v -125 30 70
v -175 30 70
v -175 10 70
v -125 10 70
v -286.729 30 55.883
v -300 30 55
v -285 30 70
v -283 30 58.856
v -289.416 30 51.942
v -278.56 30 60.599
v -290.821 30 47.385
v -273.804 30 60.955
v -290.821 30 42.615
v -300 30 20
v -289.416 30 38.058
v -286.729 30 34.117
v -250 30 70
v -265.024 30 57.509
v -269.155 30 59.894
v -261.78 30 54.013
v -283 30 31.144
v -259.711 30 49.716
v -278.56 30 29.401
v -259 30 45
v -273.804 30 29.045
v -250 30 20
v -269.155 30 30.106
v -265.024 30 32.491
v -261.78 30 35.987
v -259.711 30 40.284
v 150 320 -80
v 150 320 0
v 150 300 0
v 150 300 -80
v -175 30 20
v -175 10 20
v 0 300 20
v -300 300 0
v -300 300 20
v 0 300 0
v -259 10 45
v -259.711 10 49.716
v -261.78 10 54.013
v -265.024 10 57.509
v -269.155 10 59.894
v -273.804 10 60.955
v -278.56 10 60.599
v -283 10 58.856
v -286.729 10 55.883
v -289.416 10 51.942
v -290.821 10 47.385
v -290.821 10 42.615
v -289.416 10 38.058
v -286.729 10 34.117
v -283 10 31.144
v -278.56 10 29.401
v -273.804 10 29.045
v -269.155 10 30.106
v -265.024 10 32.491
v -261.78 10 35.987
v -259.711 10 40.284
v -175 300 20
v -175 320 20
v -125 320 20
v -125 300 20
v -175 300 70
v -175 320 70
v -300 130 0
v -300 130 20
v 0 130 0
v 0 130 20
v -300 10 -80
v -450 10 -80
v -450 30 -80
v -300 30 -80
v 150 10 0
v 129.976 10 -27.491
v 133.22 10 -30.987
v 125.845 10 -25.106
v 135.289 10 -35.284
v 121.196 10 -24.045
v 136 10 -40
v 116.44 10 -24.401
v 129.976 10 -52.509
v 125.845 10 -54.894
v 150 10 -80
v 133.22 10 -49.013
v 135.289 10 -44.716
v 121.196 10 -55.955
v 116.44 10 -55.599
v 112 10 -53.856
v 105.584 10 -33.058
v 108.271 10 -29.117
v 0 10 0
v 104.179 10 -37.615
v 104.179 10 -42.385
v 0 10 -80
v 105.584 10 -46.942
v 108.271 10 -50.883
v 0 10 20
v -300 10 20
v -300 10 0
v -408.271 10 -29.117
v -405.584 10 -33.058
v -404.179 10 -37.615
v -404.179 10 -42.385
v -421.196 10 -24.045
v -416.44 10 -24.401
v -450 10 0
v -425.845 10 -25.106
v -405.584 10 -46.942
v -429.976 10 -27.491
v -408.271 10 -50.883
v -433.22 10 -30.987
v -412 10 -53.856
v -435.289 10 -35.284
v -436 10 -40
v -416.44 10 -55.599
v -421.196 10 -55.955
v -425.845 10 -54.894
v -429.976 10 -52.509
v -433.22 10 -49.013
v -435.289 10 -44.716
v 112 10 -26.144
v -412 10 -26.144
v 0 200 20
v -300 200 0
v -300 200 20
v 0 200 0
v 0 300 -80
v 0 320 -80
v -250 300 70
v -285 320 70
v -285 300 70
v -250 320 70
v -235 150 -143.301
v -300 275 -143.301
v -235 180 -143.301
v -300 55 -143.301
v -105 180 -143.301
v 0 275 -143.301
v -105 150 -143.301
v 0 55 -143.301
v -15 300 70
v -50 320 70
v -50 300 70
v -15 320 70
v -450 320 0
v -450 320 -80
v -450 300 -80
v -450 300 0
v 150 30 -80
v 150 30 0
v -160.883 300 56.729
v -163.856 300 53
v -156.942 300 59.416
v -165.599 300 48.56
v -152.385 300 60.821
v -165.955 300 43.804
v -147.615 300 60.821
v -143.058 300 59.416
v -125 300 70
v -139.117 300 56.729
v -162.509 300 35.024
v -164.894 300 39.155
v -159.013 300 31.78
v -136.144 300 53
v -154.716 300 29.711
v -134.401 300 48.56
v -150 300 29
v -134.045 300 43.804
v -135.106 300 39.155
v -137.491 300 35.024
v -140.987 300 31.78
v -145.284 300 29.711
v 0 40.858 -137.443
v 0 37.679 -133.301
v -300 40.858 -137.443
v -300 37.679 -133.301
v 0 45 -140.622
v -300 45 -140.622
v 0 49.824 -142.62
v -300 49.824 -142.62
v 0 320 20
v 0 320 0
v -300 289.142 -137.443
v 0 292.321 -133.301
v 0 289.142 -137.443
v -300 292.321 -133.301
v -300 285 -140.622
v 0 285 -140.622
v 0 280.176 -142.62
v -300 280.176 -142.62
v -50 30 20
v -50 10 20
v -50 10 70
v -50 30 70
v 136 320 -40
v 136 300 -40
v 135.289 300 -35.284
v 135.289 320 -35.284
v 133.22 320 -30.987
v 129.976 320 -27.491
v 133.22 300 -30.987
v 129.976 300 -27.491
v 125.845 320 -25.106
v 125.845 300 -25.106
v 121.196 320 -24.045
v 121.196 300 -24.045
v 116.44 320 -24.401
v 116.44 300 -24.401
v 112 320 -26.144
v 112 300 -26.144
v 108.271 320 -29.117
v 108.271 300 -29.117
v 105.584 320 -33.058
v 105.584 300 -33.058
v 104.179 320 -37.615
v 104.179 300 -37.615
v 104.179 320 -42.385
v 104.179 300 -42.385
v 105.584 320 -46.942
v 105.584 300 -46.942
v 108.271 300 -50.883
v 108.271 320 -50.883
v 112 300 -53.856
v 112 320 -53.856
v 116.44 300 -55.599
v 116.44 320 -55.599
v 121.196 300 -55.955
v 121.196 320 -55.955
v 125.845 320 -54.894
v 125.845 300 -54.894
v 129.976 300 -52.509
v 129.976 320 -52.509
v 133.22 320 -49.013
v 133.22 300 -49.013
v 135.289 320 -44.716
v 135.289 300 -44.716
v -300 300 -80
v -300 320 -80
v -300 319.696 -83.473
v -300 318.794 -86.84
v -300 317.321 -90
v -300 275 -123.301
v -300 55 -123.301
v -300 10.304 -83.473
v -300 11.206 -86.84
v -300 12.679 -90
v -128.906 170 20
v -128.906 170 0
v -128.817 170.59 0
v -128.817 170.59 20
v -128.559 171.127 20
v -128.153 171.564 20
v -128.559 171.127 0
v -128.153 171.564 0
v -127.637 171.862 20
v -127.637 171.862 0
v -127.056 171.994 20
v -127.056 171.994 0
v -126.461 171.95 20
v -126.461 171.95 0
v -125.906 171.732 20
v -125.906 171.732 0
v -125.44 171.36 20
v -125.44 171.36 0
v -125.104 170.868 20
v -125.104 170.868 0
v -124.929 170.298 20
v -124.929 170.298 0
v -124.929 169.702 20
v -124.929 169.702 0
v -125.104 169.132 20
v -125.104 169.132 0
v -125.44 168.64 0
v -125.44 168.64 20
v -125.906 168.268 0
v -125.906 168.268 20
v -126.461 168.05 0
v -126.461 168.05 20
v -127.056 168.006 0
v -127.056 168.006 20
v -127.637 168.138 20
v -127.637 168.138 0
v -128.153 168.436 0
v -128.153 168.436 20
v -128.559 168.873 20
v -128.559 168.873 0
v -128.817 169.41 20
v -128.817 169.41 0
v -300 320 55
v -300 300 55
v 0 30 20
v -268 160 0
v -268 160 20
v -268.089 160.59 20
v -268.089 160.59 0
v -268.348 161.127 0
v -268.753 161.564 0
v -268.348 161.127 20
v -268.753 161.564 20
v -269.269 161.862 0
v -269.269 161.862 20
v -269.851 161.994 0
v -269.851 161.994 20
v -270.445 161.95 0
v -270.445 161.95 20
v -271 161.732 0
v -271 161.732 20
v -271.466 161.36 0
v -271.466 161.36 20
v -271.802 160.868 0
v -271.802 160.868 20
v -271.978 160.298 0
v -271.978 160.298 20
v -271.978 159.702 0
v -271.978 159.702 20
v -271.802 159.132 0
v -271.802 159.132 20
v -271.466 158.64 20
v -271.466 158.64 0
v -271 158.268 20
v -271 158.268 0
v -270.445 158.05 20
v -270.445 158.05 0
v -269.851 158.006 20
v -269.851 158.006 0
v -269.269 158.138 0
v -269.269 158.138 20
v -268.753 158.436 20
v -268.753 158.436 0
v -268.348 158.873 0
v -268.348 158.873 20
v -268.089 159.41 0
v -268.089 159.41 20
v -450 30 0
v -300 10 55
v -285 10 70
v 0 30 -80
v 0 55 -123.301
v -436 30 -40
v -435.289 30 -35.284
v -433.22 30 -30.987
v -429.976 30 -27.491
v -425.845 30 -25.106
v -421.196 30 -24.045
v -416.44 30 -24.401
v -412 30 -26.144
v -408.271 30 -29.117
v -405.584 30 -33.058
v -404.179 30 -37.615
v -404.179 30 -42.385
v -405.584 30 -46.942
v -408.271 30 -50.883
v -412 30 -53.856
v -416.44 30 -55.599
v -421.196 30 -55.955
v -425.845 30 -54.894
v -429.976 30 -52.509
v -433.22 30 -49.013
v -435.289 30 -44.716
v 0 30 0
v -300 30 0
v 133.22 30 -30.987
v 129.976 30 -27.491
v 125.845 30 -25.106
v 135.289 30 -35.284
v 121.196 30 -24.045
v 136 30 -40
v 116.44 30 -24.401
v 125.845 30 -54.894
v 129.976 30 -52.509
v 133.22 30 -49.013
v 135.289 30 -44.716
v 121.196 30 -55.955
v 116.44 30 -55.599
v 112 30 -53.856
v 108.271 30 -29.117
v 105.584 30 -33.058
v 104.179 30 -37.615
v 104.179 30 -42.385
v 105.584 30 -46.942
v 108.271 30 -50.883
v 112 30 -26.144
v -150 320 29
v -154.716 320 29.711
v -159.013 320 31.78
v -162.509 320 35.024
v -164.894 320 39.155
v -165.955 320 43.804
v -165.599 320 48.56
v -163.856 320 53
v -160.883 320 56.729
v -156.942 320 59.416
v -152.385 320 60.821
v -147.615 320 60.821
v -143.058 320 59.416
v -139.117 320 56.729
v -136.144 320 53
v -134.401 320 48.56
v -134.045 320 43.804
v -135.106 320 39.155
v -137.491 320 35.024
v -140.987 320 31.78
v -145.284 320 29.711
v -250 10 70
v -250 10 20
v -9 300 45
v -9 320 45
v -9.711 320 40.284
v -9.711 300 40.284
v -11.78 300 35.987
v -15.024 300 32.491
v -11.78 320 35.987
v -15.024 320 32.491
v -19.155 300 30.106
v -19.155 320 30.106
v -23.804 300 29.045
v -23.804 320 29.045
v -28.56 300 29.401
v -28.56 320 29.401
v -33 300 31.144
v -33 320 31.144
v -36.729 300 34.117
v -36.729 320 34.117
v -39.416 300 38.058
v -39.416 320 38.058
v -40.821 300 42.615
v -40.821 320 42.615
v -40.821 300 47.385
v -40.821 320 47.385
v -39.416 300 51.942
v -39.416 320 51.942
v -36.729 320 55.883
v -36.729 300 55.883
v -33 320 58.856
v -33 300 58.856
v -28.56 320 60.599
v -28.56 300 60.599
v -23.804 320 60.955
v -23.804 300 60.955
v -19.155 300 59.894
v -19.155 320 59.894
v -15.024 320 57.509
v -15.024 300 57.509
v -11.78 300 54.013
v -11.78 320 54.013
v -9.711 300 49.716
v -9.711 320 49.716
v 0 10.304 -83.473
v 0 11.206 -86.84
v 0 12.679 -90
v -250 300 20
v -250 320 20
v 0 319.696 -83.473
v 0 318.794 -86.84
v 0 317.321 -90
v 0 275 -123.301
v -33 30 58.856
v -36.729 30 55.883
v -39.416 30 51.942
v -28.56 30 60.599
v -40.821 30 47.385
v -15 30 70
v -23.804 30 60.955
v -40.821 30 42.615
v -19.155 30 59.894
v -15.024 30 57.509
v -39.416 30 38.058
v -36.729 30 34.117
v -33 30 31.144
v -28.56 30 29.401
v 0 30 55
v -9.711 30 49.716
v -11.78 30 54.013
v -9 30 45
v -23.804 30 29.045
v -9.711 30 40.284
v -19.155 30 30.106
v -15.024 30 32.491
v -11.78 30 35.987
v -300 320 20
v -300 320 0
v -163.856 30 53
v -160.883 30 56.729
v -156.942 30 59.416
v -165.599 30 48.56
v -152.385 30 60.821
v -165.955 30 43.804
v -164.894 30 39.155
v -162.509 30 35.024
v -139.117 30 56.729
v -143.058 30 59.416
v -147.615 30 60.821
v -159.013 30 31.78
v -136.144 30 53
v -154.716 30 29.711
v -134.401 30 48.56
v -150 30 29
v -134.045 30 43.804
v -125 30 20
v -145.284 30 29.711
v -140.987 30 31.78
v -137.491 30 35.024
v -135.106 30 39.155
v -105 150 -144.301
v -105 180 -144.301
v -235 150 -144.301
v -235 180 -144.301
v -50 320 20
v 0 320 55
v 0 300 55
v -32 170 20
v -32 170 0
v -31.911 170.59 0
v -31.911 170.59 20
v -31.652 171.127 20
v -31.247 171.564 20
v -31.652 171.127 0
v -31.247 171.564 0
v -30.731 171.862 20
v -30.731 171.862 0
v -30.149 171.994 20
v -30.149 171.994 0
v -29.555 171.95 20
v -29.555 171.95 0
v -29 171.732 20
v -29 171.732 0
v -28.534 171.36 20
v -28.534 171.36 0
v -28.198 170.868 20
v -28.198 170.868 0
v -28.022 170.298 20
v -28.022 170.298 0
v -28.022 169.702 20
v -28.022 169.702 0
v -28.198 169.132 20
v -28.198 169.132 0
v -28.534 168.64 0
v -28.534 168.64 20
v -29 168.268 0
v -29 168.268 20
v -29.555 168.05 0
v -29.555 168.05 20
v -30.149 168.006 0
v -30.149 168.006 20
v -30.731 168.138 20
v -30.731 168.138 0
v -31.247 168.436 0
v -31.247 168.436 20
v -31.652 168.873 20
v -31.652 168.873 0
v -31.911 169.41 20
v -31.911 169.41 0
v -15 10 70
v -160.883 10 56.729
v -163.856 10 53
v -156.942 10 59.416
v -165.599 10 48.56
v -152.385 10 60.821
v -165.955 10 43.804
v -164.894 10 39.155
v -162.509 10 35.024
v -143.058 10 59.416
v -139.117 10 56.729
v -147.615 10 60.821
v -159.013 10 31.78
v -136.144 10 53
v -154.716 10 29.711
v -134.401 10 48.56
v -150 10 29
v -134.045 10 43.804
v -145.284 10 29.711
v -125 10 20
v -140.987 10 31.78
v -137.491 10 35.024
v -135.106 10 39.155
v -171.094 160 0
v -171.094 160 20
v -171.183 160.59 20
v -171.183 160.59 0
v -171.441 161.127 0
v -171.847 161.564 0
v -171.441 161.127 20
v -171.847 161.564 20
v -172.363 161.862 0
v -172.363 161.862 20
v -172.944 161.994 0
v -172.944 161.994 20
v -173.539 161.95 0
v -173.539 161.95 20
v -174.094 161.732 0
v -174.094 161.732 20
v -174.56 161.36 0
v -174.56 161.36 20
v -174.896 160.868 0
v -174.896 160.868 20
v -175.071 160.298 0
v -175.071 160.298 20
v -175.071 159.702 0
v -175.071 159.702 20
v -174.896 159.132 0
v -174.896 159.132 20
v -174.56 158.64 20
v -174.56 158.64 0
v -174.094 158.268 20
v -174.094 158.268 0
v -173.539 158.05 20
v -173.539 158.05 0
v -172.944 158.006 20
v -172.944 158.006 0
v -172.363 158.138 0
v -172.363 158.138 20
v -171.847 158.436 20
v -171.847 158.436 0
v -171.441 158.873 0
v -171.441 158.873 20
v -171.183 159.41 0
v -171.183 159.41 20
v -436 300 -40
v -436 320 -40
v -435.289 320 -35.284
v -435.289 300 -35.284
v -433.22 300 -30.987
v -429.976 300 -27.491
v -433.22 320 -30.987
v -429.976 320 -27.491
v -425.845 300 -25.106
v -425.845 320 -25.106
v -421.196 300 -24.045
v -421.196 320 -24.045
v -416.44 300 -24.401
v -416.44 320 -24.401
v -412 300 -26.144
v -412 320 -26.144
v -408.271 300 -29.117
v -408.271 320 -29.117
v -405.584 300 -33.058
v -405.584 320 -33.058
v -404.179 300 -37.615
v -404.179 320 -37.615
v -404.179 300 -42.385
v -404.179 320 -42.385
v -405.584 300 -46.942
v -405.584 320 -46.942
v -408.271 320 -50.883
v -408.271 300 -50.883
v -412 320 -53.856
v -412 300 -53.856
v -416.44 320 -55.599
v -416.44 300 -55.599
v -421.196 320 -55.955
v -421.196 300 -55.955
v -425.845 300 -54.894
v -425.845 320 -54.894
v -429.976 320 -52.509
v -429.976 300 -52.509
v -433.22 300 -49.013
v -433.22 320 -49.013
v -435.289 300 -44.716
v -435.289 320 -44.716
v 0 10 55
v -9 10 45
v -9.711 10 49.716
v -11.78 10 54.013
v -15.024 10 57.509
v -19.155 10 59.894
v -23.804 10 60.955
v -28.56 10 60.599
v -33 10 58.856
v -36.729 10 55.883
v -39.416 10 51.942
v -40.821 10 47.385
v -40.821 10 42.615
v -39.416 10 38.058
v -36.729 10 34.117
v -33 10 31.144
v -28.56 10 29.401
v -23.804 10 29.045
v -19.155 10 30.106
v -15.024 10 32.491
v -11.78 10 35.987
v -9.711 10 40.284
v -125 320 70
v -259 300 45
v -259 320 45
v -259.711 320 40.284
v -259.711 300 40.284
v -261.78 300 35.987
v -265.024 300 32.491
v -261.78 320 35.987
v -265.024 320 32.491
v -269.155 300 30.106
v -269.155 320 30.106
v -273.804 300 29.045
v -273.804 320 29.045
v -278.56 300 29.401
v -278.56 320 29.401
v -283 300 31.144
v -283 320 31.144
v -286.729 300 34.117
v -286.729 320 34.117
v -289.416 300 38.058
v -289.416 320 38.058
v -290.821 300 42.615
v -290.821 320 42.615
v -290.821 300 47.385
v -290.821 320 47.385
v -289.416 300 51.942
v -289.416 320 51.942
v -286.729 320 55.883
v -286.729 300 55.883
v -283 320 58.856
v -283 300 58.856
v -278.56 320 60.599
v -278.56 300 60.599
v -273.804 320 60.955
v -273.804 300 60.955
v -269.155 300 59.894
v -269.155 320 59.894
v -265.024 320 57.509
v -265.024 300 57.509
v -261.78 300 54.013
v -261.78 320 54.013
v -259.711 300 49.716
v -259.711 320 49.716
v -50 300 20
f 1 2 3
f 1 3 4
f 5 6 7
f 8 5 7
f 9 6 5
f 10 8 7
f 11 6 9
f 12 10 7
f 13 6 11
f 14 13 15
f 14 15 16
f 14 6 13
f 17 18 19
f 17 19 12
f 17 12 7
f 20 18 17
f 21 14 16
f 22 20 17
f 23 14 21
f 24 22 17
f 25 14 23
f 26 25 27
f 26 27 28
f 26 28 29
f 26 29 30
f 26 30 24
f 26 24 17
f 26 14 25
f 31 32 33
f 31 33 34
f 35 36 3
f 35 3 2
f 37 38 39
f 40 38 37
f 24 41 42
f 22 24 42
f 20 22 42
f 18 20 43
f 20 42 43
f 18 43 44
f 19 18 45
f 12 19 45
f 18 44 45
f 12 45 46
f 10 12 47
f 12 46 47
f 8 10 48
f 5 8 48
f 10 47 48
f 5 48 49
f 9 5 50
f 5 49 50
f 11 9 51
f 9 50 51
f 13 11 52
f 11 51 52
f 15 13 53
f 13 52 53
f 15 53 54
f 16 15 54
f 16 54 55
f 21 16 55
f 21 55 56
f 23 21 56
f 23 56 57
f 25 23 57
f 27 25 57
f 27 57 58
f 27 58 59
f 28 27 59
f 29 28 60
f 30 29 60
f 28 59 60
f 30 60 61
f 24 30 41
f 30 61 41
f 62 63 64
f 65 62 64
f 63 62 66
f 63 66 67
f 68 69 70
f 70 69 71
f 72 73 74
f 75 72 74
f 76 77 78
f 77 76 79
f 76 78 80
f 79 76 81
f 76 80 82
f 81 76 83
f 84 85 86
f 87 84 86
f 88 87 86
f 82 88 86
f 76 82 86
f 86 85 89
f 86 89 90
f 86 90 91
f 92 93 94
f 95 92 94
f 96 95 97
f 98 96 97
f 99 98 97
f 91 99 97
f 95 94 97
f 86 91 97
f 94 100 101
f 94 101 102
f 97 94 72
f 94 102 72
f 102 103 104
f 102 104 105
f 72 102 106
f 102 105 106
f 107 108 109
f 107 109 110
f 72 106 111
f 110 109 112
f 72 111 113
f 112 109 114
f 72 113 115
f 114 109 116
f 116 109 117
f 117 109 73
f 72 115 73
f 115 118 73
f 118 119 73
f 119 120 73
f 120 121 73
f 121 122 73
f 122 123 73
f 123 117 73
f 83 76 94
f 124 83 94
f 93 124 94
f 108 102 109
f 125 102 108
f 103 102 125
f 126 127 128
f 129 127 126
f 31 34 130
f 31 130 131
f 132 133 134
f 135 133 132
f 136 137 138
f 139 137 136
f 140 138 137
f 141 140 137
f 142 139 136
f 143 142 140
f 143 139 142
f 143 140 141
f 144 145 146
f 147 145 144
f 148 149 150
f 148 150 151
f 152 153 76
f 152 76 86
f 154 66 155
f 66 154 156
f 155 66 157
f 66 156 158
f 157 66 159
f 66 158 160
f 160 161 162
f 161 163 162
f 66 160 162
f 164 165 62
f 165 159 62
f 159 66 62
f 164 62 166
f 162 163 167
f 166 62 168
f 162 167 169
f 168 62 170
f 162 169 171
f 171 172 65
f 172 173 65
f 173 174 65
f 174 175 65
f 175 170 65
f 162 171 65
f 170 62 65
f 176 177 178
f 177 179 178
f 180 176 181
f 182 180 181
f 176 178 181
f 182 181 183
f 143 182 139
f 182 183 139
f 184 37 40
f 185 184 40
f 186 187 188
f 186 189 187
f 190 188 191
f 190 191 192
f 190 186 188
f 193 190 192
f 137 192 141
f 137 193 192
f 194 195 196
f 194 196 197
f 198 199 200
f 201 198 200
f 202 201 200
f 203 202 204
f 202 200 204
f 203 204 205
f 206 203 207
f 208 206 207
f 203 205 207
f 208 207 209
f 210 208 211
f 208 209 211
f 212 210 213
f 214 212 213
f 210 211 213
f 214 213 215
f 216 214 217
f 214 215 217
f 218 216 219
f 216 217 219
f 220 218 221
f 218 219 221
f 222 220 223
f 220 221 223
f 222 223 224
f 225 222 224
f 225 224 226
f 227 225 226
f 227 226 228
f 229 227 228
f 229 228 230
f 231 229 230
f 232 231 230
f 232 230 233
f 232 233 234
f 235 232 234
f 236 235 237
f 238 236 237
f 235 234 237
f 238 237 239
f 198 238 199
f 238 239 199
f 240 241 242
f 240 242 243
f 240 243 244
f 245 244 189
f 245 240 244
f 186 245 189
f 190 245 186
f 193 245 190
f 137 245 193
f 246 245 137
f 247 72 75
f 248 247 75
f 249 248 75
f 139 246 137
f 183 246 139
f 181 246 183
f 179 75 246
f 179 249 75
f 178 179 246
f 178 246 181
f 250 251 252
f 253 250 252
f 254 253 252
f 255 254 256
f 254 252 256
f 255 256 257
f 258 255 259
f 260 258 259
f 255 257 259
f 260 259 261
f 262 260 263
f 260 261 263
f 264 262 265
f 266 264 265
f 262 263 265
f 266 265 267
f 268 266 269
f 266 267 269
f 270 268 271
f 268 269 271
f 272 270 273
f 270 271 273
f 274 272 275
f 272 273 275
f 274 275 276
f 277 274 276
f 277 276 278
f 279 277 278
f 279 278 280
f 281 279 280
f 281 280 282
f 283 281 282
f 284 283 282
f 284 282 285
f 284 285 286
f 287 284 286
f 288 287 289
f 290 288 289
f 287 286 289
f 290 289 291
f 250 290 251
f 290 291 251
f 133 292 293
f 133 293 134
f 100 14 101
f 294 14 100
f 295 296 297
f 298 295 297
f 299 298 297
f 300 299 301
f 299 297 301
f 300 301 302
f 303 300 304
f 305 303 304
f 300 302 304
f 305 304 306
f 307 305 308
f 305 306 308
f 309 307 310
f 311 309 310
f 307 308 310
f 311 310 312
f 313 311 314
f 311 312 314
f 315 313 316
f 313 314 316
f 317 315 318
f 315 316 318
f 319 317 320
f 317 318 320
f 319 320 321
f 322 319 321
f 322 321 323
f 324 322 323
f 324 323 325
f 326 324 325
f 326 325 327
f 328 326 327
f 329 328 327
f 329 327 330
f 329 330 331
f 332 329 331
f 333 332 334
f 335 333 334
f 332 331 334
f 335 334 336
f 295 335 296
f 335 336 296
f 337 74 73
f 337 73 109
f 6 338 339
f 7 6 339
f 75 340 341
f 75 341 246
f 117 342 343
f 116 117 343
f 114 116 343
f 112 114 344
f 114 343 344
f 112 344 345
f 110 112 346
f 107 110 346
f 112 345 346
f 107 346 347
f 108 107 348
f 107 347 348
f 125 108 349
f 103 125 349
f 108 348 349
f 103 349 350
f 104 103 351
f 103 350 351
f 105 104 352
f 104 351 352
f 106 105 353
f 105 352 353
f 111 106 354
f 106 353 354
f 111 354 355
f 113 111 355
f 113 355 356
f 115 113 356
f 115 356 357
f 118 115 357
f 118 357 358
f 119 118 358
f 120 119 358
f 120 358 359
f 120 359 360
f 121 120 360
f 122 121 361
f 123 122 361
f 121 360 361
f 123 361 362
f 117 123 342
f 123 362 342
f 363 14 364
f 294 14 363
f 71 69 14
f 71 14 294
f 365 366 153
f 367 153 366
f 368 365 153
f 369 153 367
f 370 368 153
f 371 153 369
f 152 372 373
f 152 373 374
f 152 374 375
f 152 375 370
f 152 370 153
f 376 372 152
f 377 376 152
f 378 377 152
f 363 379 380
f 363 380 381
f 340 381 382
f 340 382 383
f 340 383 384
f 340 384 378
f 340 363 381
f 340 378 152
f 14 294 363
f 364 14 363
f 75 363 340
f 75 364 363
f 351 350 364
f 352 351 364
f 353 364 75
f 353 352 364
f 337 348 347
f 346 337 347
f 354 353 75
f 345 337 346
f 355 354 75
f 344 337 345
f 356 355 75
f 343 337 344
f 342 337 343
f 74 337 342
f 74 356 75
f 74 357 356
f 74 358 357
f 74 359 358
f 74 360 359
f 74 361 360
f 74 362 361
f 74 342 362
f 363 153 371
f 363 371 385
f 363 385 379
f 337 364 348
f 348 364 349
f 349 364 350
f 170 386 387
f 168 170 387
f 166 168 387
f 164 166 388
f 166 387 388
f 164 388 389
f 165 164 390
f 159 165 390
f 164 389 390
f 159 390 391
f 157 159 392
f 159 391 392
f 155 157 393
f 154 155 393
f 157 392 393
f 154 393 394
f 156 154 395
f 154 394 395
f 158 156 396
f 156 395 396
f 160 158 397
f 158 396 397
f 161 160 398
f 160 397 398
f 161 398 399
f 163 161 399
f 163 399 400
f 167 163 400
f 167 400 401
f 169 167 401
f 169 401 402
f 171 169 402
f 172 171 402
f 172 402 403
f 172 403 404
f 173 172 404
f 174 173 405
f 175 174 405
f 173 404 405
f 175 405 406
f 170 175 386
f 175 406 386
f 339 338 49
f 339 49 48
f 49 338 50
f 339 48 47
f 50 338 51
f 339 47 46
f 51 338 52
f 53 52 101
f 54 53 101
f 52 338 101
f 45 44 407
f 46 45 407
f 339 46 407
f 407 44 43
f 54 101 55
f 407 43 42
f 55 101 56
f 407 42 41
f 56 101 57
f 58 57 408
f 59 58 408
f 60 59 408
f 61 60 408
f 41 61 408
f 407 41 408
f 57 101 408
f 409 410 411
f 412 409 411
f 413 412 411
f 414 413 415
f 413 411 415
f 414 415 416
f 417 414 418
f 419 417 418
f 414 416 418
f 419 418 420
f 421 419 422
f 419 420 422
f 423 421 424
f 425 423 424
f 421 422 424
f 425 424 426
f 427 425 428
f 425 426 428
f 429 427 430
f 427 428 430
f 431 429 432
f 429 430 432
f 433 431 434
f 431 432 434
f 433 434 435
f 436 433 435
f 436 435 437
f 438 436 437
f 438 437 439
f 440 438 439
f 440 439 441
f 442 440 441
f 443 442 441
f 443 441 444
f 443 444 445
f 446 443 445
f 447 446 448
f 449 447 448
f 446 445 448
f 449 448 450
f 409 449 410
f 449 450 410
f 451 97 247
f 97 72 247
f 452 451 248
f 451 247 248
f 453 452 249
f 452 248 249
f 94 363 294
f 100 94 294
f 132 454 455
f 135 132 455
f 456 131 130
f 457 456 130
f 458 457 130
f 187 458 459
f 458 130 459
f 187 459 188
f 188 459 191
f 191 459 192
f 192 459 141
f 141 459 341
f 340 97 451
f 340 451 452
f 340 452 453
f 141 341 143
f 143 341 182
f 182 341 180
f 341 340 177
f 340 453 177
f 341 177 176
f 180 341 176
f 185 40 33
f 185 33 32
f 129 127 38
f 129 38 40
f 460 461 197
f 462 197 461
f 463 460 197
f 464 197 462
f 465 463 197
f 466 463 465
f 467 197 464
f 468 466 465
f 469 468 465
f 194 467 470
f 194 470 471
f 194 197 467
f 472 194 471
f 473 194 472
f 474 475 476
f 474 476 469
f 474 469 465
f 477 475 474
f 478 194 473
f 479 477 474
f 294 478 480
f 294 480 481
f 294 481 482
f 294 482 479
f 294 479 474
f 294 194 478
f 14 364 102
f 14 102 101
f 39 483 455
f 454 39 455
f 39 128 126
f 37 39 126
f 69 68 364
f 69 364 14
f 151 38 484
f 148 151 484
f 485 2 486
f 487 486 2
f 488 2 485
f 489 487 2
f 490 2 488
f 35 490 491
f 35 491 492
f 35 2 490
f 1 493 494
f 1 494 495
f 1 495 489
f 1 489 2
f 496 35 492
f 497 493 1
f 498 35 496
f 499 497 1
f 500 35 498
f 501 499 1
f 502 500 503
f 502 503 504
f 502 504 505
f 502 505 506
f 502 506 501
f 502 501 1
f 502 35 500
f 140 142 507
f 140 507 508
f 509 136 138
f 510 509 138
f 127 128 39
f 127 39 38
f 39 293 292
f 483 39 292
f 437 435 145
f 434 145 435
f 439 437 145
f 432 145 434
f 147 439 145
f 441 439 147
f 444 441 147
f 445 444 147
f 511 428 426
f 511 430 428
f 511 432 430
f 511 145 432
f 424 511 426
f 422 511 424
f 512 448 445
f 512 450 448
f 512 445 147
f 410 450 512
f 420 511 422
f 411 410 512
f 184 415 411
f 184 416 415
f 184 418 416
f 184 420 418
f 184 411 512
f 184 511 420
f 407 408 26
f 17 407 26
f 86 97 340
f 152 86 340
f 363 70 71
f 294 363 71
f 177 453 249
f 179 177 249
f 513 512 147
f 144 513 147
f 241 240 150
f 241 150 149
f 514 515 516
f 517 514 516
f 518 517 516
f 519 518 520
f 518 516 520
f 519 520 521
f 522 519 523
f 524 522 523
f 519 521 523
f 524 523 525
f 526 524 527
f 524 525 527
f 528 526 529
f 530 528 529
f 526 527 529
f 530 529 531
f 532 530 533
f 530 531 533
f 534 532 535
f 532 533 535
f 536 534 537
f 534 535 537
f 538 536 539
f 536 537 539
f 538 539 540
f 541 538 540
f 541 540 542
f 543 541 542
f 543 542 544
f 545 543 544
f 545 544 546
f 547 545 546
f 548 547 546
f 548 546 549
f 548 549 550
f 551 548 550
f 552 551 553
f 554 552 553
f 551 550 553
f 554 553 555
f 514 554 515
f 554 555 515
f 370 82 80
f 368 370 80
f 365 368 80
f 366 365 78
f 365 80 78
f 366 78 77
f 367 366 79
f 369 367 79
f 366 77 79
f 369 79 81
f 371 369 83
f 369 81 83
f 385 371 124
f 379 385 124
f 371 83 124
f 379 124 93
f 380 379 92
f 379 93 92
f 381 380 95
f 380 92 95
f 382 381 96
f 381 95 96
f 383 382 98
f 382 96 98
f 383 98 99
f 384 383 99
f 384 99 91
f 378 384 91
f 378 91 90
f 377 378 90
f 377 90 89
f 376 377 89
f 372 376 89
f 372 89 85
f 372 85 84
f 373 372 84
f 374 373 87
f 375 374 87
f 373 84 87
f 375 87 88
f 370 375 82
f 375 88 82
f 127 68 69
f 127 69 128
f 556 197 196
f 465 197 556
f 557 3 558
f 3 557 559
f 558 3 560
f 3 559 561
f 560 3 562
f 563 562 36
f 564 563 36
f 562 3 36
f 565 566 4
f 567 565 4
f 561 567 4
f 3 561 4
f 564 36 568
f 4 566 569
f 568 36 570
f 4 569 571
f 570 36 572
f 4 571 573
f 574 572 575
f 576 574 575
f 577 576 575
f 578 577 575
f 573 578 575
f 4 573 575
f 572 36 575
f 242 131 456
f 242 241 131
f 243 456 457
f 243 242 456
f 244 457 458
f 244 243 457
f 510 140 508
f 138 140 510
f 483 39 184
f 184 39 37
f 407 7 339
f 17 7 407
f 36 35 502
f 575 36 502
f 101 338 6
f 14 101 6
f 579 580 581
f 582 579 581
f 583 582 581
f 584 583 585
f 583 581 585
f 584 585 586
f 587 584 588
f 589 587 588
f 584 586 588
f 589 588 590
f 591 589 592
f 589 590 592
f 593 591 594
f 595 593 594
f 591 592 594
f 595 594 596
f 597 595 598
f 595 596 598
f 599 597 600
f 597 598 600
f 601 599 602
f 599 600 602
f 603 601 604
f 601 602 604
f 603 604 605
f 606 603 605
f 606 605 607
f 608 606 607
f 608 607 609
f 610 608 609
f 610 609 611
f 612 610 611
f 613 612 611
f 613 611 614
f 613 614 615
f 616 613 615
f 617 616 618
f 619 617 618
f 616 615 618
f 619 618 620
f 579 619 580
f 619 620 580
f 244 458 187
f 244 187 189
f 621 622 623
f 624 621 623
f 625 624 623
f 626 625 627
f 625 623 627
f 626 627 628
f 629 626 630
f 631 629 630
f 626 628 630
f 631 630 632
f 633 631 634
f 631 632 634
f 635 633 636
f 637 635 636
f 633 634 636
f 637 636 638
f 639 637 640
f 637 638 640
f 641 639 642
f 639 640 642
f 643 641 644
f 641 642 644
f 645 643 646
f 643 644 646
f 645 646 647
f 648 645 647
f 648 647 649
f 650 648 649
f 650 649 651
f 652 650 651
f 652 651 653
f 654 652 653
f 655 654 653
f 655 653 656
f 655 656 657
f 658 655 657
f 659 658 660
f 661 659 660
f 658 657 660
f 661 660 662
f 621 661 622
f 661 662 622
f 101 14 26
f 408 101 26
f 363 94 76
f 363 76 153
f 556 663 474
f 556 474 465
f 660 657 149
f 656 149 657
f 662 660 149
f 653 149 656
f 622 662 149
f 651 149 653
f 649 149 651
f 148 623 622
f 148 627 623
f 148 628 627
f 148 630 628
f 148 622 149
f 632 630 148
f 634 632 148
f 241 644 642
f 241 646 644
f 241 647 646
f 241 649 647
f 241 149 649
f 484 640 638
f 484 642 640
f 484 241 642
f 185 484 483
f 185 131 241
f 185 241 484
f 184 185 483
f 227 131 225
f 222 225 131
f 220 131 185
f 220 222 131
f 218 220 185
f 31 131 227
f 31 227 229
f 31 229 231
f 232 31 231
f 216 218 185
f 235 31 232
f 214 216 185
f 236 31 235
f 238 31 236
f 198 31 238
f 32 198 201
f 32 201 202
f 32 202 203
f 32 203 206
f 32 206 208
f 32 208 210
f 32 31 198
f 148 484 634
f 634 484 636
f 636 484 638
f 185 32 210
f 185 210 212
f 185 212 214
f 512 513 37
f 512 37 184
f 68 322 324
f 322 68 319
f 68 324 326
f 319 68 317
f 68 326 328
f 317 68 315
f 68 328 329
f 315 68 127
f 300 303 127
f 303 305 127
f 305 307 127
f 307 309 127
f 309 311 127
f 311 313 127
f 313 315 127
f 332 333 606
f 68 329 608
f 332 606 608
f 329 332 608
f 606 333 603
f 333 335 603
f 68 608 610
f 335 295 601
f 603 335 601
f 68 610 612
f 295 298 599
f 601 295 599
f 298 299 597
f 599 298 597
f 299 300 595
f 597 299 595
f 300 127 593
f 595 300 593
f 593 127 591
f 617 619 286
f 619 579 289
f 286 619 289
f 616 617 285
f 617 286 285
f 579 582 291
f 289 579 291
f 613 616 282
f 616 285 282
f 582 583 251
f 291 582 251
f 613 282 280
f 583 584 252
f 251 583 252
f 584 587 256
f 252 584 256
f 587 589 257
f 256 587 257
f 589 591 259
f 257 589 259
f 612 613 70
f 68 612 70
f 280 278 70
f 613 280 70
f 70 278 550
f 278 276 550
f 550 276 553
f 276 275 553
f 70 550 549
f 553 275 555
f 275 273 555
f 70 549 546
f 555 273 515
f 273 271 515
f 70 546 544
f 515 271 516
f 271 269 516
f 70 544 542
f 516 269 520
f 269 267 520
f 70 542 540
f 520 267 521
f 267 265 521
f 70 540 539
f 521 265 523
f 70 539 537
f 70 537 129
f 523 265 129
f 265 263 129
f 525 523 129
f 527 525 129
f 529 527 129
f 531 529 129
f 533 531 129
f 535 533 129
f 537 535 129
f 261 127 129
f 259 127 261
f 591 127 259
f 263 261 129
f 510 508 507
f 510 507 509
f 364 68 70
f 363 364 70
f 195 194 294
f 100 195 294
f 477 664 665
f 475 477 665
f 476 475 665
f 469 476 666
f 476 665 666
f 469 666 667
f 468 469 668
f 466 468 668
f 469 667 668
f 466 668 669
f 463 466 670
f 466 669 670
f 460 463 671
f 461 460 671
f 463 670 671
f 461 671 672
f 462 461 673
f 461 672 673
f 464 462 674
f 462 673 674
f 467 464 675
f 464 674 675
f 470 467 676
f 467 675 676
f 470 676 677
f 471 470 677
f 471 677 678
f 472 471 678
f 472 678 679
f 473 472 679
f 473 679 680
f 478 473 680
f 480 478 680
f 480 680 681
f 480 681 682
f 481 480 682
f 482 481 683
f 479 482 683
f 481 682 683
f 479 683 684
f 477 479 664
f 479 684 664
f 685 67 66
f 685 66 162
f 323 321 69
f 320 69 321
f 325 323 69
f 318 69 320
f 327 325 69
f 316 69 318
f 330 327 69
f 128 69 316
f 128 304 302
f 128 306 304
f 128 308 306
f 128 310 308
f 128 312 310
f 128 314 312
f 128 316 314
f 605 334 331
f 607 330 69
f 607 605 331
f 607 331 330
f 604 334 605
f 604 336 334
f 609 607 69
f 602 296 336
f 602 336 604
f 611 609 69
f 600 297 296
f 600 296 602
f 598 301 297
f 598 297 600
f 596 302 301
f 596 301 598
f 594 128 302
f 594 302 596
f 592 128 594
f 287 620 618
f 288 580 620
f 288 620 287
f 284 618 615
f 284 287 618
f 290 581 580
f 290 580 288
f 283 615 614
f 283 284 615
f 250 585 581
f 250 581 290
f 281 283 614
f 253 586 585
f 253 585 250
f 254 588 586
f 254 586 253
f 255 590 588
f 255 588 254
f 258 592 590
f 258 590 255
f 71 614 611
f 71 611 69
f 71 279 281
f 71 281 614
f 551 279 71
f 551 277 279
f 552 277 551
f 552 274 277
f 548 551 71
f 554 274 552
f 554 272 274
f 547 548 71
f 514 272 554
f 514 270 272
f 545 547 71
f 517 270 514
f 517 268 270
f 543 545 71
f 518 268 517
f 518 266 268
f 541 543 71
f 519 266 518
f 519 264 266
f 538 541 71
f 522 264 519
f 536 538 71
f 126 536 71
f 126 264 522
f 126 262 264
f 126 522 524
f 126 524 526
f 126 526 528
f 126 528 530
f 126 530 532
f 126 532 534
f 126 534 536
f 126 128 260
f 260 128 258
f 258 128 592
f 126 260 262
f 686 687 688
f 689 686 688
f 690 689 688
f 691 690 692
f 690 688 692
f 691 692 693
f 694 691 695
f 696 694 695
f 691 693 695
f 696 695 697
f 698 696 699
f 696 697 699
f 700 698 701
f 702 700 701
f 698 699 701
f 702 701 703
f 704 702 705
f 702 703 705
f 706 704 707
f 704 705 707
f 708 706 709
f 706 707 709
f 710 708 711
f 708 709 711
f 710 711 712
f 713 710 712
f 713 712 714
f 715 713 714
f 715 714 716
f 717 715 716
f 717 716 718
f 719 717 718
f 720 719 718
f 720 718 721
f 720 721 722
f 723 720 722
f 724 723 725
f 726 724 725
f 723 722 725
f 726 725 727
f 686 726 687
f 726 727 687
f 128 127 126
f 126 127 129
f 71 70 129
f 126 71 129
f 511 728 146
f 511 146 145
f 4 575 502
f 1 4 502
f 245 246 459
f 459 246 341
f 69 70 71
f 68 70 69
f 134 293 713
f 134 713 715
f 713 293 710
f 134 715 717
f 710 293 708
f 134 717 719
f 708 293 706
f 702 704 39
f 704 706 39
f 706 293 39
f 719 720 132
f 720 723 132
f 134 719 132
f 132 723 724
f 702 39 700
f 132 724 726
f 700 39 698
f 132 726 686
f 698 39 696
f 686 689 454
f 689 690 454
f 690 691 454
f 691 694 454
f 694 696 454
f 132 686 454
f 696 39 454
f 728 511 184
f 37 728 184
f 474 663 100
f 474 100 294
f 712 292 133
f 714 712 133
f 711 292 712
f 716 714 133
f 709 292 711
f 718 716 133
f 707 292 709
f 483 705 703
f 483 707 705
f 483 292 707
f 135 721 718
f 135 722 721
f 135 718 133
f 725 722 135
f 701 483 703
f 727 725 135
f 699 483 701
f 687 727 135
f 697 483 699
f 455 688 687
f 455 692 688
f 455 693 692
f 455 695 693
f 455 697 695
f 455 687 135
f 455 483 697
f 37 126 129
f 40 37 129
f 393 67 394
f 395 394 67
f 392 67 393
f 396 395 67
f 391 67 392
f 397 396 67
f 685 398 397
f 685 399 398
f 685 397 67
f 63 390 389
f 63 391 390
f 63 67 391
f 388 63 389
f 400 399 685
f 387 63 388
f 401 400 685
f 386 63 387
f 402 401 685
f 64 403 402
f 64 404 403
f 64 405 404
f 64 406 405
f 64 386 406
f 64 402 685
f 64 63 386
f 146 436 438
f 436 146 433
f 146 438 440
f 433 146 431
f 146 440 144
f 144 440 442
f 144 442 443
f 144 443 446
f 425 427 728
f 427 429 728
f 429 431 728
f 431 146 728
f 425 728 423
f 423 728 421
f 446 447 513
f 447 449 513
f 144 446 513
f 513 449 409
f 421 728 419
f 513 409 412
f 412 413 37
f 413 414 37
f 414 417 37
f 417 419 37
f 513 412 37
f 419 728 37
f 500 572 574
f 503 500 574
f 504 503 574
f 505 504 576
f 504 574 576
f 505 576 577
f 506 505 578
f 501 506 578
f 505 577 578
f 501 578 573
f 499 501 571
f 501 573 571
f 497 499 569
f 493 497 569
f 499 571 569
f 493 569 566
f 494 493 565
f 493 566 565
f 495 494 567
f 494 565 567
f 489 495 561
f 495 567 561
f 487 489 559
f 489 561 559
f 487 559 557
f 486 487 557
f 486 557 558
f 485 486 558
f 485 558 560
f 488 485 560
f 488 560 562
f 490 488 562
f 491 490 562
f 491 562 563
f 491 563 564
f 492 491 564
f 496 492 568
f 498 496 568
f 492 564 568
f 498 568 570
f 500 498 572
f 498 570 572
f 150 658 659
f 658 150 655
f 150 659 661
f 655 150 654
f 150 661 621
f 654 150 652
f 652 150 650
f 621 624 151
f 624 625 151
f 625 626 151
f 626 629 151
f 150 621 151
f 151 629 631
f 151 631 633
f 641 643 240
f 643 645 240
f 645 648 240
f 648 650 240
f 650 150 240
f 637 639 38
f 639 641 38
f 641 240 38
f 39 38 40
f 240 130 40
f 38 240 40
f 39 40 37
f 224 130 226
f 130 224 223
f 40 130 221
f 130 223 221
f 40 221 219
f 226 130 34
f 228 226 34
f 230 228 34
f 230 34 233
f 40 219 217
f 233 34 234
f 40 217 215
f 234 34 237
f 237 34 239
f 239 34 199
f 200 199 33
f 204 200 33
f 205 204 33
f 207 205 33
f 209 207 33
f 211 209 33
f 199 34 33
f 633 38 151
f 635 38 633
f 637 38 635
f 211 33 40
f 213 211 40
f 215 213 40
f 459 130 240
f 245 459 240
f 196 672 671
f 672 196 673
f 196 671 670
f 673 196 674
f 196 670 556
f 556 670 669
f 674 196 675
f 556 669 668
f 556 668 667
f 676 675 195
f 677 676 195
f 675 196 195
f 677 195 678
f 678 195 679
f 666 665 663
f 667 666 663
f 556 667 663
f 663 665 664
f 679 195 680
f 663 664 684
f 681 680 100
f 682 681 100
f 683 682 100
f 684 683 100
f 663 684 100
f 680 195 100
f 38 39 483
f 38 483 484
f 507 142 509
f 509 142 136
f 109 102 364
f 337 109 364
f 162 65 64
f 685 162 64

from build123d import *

# Parameters (mm, degrees)
SKETCH1_W              = 300
SKETCH1_H              = 200
BOSS_EXTRUDE1_DEPTH    = 20
SKETCH2_R              = 2
CUT_EXTRUDE1_DEPTH     = 20
SKETCH3_W              = 300
SKETCH3_H              = 130
CUT_EXTRUDE2_DEPTH     = 20
SKETCH4_R              = 2
CUT_EXTRUDE3_DEPTH     = 20
SKETCH5_W              = 300
SKETCH5_H              = 20
BOSS_EXTRUDE2_DEPTH    = 100
SKETCH6_W              = 300
SKETCH6_H              = 20
BOSS_EXTRUDE3_DEPTH    = 100
SKETCH9_W              = 300
SKETCH9_H              = 100
BOSS_EXTRUDE6_DEPTH    = 20
SKETCH10_W             = 300
SKETCH10_H             = 100
BOSS_EXTRUDE7_DEPTH    = 20
SKETCH14_W             = 80
SKETCH14_H             = 20
BOSS_EXTRUDE11_DEPTH   = 150
SKETCH15_W             = 80
SKETCH15_H             = 20
BOSS_EXTRUDE12_DEPTH   = 150
SKETCH16_W             = 80
SKETCH16_H             = 20
BOSS_EXTRUDE13_DEPTH   = 150
SKETCH17_W             = 80
SKETCH17_H             = 20
BOSS_EXTRUDE14_DEPTH   = 150
SKETCH18_R             = 16
CUT_EXTRUDE4_DEPTH     = 20
SKETCH19_R             = 16
CUT_EXTRUDE5_DEPTH     = 20
SKETCH20_R             = 16
CUT_EXTRUDE6_DEPTH     = 20
SKETCH21_R             = 16
CUT_EXTRUDE7_DEPTH     = 20
SKETCH22_W             = 50
SKETCH22_H             = 20
BOSS_EXTRUDE15_DEPTH   = 50
BOSS_EXTRUDE15_2_DEPTH = 50
BOSS_EXTRUDE15_3_DEPTH = 50
SKETCH23_W             = 50
SKETCH23_H             = 20
BOSS_EXTRUDE16_DEPTH   = 50
BOSS_EXTRUDE16_2_DEPTH = 50
BOSS_EXTRUDE16_3_DEPTH = 50
SKETCH24_R             = 16
CUT_EXTRUDE8_DEPTH     = 20
SKETCH25_R             = 16
CUT_EXTRUDE9_DEPTH     = 20
SKETCH26_R             = 16
CUT_EXTRUDE10_DEPTH    = 20
SKETCH27_R             = 16
CUT_EXTRUDE11_DEPTH    = 20
SKETCH28_R             = 16
CUT_EXTRUDE12_DEPTH    = 20
SKETCH29_R             = 16
CUT_EXTRUDE13_DEPTH    = 20
SKETCH30_W             = 300
SKETCH30_H             = 20
REVOLVE1_ANGLE         = 30
SKETCH31_W             = 300
SKETCH31_H             = 20
REVOLVE2_ANGLE         = 30
SKETCH33_W             = 300
SKETCH33_H             = 20
BOSS_EXTRUDE18_DEPTH   = 50
SKETCH34_W             = 300
SKETCH34_H             = 20
BOSS_EXTRUDE19_DEPTH   = 50
SKETCH35_W             = 300
SKETCH35_H             = 20
REVOLVE3_ANGLE         = 60
SKETCH36_W             = 300
SKETCH36_H             = 20
REVOLVE4_ANGLE         = 60
SKETCH37_W             = 300
SKETCH37_H             = 20
BOSS_EXTRUDE20_DEPTH   = 220
SKETCH38_W             = 130
SKETCH38_H             = 30
BOSS_EXTRUDE21_DEPTH   = 1


with BuildPart() as part:
    # Sketch1 → Boss-Extrude1 (new body)
    with BuildSketch(Plane.XY):
        with Locations((-150, 100)):
            Rectangle(SKETCH1_W, SKETCH1_H)
    extrude(amount=BOSS_EXTRUDE1_DEPTH)

    # Sketch2 → Cut-Extrude1 (cut)
    with BuildSketch(Plane.XY.offset(20)):
        with Locations((-270, 160)):
            Circle(SKETCH2_R)
        with Locations((-173.0937277, 160)):
            Circle(SKETCH2_R)
    extrude(amount=-CUT_EXTRUDE1_DEPTH, mode=Mode.SUBTRACT)

    # Sketch3 → Cut-Extrude2 (cut)
    with BuildSketch(Plane(origin=(0, 0, 0), x_dir=(-1, 0, 0), z_dir=(0, 0, -1))):
        with Locations((150, 65)):
            Rectangle(SKETCH3_W, SKETCH3_H)
    extrude(amount=-CUT_EXTRUDE2_DEPTH, mode=Mode.SUBTRACT)

    # Sketch4 → Cut-Extrude3 (cut)
    with BuildSketch(Plane(origin=(0, 0, 0), x_dir=(-1, 0, 0), z_dir=(0, 0, -1))):
        with Locations((30, 170)):
            Circle(SKETCH4_R)
        with Locations((126.9062723, 170)):
            Circle(SKETCH4_R)
    extrude(amount=-CUT_EXTRUDE3_DEPTH, mode=Mode.SUBTRACT)


with BuildPart() as body_2:
    # Sketch5 → Boss-Extrude2 (new body)
    with BuildSketch(Plane(origin=(0, 200, 0), x_dir=(1, 0, 0), z_dir=(0, 1, 0))):
        with Locations((-150, -10)):
            Rectangle(SKETCH5_W, SKETCH5_H)
    extrude(amount=BOSS_EXTRUDE2_DEPTH)


with BuildPart() as body_3:
    # Sketch6 → Boss-Extrude3 (new body)
    with BuildSketch(Plane.XZ.offset(-130)):
        with Locations((-150, 10)):
            Rectangle(SKETCH6_W, SKETCH6_H)
    extrude(amount=BOSS_EXTRUDE3_DEPTH)


with BuildPart() as body_4:
    # Sketch9 → Boss-Extrude6 (new body)
    with BuildSketch(Plane.XZ.offset(-30)):
        with Locations((-150, -30)):
            Rectangle(SKETCH9_W, SKETCH9_H)
    extrude(amount=BOSS_EXTRUDE6_DEPTH)



with BuildPart() as body_5:
    # Sketch10 → Boss-Extrude7 (new body)
    with BuildSketch(Plane(origin=(0, 300, 0), x_dir=(1, 0, 0), z_dir=(0, 1, 0))):
        with Locations((-150, 30)):
            Rectangle(SKETCH10_W, SKETCH10_H)
    extrude(amount=BOSS_EXTRUDE7_DEPTH)



with BuildPart() as body_6:
    # Sketch14 → Boss-Extrude11 (new body)
    with BuildSketch(Plane(origin=(0, 0, 0), x_dir=(0, 0, -1), z_dir=(1, 0, 0))):
        with Locations((40, 310)):
            Rectangle(SKETCH14_W, SKETCH14_H)
    extrude(amount=BOSS_EXTRUDE11_DEPTH)

    # Sketch19 → Cut-Extrude5 (cut)
    with BuildSketch(Plane.XZ.offset(-300)):
        with Locations((120, -40)):
            Circle(SKETCH19_R)
    extrude(amount=-CUT_EXTRUDE5_DEPTH, mode=Mode.SUBTRACT)


with BuildPart() as body_7:
    # Sketch15 → Boss-Extrude12 (new body)
    with BuildSketch(Plane.ZY.offset(300)):
        with Locations((-40, 310)):
            Rectangle(SKETCH15_W, SKETCH15_H)
    extrude(amount=BOSS_EXTRUDE12_DEPTH)

    # Sketch20 → Cut-Extrude6 (cut)
    with BuildSketch(Plane(origin=(0, 320, 0), x_dir=(1, 0, 0), z_dir=(0, 1, 0))):
        with Locations(Location((-420, 40, 0), (0, 0, 180))):
            Circle(SKETCH20_R)
    extrude(amount=-CUT_EXTRUDE6_DEPTH, mode=Mode.SUBTRACT)


with BuildPart() as body_8:
    # Sketch16 → Boss-Extrude13 (new body)
    with BuildSketch(Plane.ZY.offset(300)):
        with Locations((-40, 20)):
            Rectangle(SKETCH16_W, SKETCH16_H)
    extrude(amount=BOSS_EXTRUDE13_DEPTH)

    # Sketch21 → Cut-Extrude7 (cut)
    with BuildSketch(Plane(origin=(0, 30, 0), x_dir=(1, 0, 0), z_dir=(0, 1, 0))):
        with Locations(Location((-420, 40, 0), (0, 0, 180))):
            Circle(SKETCH21_R)
    extrude(amount=-CUT_EXTRUDE7_DEPTH, mode=Mode.SUBTRACT)


with BuildPart() as body_9:
    # Sketch17 → Boss-Extrude14 (new body)
    with BuildSketch(Plane(origin=(0, 0, 0), x_dir=(0, 0, -1), z_dir=(1, 0, 0))):
        with Locations((40, 20)):
            Rectangle(SKETCH17_W, SKETCH17_H)
    extrude(amount=BOSS_EXTRUDE14_DEPTH)

    # Sketch18 → Cut-Extrude4 (cut)
    with BuildSketch(Plane.XZ.offset(-10)):
        with Locations((120, -40)):
            Circle(SKETCH18_R)
    extrude(amount=-CUT_EXTRUDE4_DEPTH, mode=Mode.SUBTRACT)


with BuildPart() as body_10:
    # Sketch22 → Boss-Extrude15 (new body)
    with BuildSketch(Plane.XY.offset(20)):
        with Locations((-275, 310)):
            Rectangle(SKETCH22_W, SKETCH22_H)
    extrude(amount=BOSS_EXTRUDE15_DEPTH)

    # Sketch27 → Cut-Extrude11 (cut)
    with BuildSketch(Plane(origin=(0, 320, 0), x_dir=(1, 0, 0), z_dir=(0, 1, 0))):
        with Locations((-275, -45)):
            Circle(SKETCH27_R)
        Polygon((-300, -55), (-285, -70), (-300, -70), align=None)
    extrude(amount=-CUT_EXTRUDE11_DEPTH, mode=Mode.SUBTRACT)


with BuildPart() as body_11:
    # Sketch22 → Boss-Extrude15 2 (new body)
    with BuildSketch(Plane.XY.offset(20)):
        with Locations((-150, 310)):
            Rectangle(SKETCH22_W, SKETCH22_H)
    extrude(amount=BOSS_EXTRUDE15_2_DEPTH)

    # Sketch28 → Cut-Extrude12 (cut)
    with BuildSketch(Plane(origin=(0, 320, 0), x_dir=(1, 0, 0), z_dir=(0, 1, 0))):
        with Locations(Location((-150, -45, 0), (0, 0, 90))):
            Circle(SKETCH28_R)
    extrude(amount=-CUT_EXTRUDE12_DEPTH, mode=Mode.SUBTRACT)


with BuildPart() as body_12:
    # Sketch22 → Boss-Extrude15 3 (new body)
    with BuildSketch(Plane.XY.offset(20)):
        with Locations((-25, 310)):
            Rectangle(SKETCH22_W, SKETCH22_H)
    extrude(amount=BOSS_EXTRUDE15_3_DEPTH)

    # Sketch29 → Cut-Extrude13 (cut)
    with BuildSketch(Plane(origin=(0, 320, 0), x_dir=(1, 0, 0), z_dir=(0, 1, 0))):
        with Locations((-25, -45)):
            Circle(SKETCH29_R)
        Polygon((0, -55), (-15, -70), (0, -70), align=None)
    extrude(amount=-CUT_EXTRUDE13_DEPTH, mode=Mode.SUBTRACT)


with BuildPart() as body_13:
    # Sketch23 → Boss-Extrude16 (new body)
    with BuildSketch(Plane.XY.offset(20)):
        with Locations((-275, 20)):
            Rectangle(SKETCH23_W, SKETCH23_H)
    extrude(amount=BOSS_EXTRUDE16_DEPTH)

    # Sketch26 → Cut-Extrude10 (cut)
    with BuildSketch(Plane.XZ.offset(-10)):
        with Locations((-275, 45)):
            Circle(SKETCH26_R)
        Polygon((-300, 55), (-285, 70), (-300, 70), align=None)
    extrude(amount=-CUT_EXTRUDE10_DEPTH, mode=Mode.SUBTRACT)


with BuildPart() as body_14:
    # Sketch23 → Boss-Extrude16 2 (new body)
    with BuildSketch(Plane.XY.offset(20)):
        with Locations((-150, 20)):
            Rectangle(SKETCH23_W, SKETCH23_H)
    extrude(amount=BOSS_EXTRUDE16_2_DEPTH)

    # Sketch25 → Cut-Extrude9 (cut)
    with BuildSketch(Plane.XZ.offset(-10)):
        with Locations(Location((-150, 45, 0), (0, 0, 270))):
            Circle(SKETCH25_R)
    extrude(amount=-CUT_EXTRUDE9_DEPTH, mode=Mode.SUBTRACT)


with BuildPart() as body_15:
    # Sketch23 → Boss-Extrude16 3 (new body)
    with BuildSketch(Plane.XY.offset(20)):
        with Locations((-25, 20)):
            Rectangle(SKETCH23_W, SKETCH23_H)
    extrude(amount=BOSS_EXTRUDE16_3_DEPTH)

    # Sketch24 → Cut-Extrude8 (cut)
    with BuildSketch(Plane.XZ.offset(-10)):
        with Locations((-25, 45)):
            Circle(SKETCH24_R)
        Polygon((0, 55), (-15, 70), (0, 70), align=None)
    extrude(amount=-CUT_EXTRUDE8_DEPTH, mode=Mode.SUBTRACT)


with BuildPart() as body_4_1:
    add(body_4.part)

    add(body_8.part)  # Revolve1 merges body 8

    add(body_9.part)  # Revolve1 merges body 9
    # Sketch30 → Revolve1 (revolve)
    with BuildSketch(Plane(origin=(0, 0, -80), x_dir=(-1, 0, 0), z_dir=(0, 0, -1))):
        with Locations((150, 20)):
            Rectangle(SKETCH30_W, SKETCH30_H)
    revolve(axis=Axis((0, 30, -80), (1, 0, 0)), revolution_arc=REVOLVE1_ANGLE)

    # Sketch33 → Boss-Extrude18 (add)
    with BuildSketch(Plane(origin=(0, 42.141016151, -72.990381057), x_dir=(-1, 0, 0), z_dir=(0, 0.500000000000001, -0.8660254037844382))):
        with Locations((150, -24.019237886)):
            Rectangle(SKETCH33_W, SKETCH33_H)
    extrude(amount=BOSS_EXTRUDE18_DEPTH)

    # Sketch35 → Revolve3 (revolve)
    with BuildSketch(Plane(origin=(0, 67.141016151, -116.291651246), x_dir=(-1, 0, 0), z_dir=(0, 0.5000000000000007, -0.8660254037844382))):
        with Locations((150, -24.019237886)):
            Rectangle(SKETCH35_W, SKETCH35_H)
    revolve(axis=Axis((0, 55, -123.301270189), (1, 0, 0)), revolution_arc=REVOLVE3_ANGLE)



with BuildPart() as body_5_1:
    add(body_5.part)

    add(body_6.part)  # Revolve2 merges body 6

    add(body_7.part)  # Revolve2 merges body 7
    # Sketch31 → Revolve2 (revolve)
    with BuildSketch(Plane(origin=(0, 0, -80), x_dir=(-1, 0, 0), z_dir=(0, 0, -1))):
        with Locations((150, 310)):
            Rectangle(SKETCH31_W, SKETCH31_H)
    revolve(axis=Axis((0, 300, -80), (-1, 0, 0)), revolution_arc=REVOLVE2_ANGLE)

    # Sketch34 → Boss-Extrude19 (add)
    with BuildSketch(Plane(origin=(0, 40.358983849, 69.903810568), x_dir=(-1, 0, 0), z_dir=(0, -0.500000000000001, -0.8660254037844382))):
        with Locations((150, 309.807621135)):
            Rectangle(SKETCH34_W, SKETCH34_H)
    extrude(amount=BOSS_EXTRUDE19_DEPTH)

    # Sketch36 → Revolve4 (revolve)
    with BuildSketch(Plane(origin=(0, 15.358983849, 26.602540378), x_dir=(-1, 0, 0), z_dir=(0, -0.5000000000000009, -0.8660254037844383))):
        with Locations((150, 309.807621135)):
            Rectangle(SKETCH36_W, SKETCH36_H)
    revolve(axis=Axis((0, 275, -123.301270189), (-1, 0, 0)), revolution_arc=REVOLVE4_ANGLE)


with BuildPart() as body_4_2:
    add(body_4_1.part)

    add(body_5_1.part)  # Boss-Extrude20 merges body 5
    # Sketch37 → Boss-Extrude20 (add)
    with BuildSketch(Plane(origin=(0, 55, 0), x_dir=(1, 0, 0), z_dir=(0, 1, 0))):
        with Locations((-150, 133.301270189)):
            Rectangle(SKETCH37_W, SKETCH37_H)
    extrude(amount=BOSS_EXTRUDE20_DEPTH)

    # Sketch38 → Boss-Extrude21 (add)
    with BuildSketch(Plane(origin=(0, 0, -143.301270189), x_dir=(-1, 0, 0), z_dir=(0, 0, -1))):
        with Locations((170, 165)):
            Rectangle(SKETCH38_W, SKETCH38_H)
    extrude(amount=BOSS_EXTRUDE21_DEPTH)


solid = Compound([part.part, body_2.part, body_3.part, body_10.part, body_11.part, body_12.part, body_13.part, body_14.part, body_15.part, body_4_2.part])
